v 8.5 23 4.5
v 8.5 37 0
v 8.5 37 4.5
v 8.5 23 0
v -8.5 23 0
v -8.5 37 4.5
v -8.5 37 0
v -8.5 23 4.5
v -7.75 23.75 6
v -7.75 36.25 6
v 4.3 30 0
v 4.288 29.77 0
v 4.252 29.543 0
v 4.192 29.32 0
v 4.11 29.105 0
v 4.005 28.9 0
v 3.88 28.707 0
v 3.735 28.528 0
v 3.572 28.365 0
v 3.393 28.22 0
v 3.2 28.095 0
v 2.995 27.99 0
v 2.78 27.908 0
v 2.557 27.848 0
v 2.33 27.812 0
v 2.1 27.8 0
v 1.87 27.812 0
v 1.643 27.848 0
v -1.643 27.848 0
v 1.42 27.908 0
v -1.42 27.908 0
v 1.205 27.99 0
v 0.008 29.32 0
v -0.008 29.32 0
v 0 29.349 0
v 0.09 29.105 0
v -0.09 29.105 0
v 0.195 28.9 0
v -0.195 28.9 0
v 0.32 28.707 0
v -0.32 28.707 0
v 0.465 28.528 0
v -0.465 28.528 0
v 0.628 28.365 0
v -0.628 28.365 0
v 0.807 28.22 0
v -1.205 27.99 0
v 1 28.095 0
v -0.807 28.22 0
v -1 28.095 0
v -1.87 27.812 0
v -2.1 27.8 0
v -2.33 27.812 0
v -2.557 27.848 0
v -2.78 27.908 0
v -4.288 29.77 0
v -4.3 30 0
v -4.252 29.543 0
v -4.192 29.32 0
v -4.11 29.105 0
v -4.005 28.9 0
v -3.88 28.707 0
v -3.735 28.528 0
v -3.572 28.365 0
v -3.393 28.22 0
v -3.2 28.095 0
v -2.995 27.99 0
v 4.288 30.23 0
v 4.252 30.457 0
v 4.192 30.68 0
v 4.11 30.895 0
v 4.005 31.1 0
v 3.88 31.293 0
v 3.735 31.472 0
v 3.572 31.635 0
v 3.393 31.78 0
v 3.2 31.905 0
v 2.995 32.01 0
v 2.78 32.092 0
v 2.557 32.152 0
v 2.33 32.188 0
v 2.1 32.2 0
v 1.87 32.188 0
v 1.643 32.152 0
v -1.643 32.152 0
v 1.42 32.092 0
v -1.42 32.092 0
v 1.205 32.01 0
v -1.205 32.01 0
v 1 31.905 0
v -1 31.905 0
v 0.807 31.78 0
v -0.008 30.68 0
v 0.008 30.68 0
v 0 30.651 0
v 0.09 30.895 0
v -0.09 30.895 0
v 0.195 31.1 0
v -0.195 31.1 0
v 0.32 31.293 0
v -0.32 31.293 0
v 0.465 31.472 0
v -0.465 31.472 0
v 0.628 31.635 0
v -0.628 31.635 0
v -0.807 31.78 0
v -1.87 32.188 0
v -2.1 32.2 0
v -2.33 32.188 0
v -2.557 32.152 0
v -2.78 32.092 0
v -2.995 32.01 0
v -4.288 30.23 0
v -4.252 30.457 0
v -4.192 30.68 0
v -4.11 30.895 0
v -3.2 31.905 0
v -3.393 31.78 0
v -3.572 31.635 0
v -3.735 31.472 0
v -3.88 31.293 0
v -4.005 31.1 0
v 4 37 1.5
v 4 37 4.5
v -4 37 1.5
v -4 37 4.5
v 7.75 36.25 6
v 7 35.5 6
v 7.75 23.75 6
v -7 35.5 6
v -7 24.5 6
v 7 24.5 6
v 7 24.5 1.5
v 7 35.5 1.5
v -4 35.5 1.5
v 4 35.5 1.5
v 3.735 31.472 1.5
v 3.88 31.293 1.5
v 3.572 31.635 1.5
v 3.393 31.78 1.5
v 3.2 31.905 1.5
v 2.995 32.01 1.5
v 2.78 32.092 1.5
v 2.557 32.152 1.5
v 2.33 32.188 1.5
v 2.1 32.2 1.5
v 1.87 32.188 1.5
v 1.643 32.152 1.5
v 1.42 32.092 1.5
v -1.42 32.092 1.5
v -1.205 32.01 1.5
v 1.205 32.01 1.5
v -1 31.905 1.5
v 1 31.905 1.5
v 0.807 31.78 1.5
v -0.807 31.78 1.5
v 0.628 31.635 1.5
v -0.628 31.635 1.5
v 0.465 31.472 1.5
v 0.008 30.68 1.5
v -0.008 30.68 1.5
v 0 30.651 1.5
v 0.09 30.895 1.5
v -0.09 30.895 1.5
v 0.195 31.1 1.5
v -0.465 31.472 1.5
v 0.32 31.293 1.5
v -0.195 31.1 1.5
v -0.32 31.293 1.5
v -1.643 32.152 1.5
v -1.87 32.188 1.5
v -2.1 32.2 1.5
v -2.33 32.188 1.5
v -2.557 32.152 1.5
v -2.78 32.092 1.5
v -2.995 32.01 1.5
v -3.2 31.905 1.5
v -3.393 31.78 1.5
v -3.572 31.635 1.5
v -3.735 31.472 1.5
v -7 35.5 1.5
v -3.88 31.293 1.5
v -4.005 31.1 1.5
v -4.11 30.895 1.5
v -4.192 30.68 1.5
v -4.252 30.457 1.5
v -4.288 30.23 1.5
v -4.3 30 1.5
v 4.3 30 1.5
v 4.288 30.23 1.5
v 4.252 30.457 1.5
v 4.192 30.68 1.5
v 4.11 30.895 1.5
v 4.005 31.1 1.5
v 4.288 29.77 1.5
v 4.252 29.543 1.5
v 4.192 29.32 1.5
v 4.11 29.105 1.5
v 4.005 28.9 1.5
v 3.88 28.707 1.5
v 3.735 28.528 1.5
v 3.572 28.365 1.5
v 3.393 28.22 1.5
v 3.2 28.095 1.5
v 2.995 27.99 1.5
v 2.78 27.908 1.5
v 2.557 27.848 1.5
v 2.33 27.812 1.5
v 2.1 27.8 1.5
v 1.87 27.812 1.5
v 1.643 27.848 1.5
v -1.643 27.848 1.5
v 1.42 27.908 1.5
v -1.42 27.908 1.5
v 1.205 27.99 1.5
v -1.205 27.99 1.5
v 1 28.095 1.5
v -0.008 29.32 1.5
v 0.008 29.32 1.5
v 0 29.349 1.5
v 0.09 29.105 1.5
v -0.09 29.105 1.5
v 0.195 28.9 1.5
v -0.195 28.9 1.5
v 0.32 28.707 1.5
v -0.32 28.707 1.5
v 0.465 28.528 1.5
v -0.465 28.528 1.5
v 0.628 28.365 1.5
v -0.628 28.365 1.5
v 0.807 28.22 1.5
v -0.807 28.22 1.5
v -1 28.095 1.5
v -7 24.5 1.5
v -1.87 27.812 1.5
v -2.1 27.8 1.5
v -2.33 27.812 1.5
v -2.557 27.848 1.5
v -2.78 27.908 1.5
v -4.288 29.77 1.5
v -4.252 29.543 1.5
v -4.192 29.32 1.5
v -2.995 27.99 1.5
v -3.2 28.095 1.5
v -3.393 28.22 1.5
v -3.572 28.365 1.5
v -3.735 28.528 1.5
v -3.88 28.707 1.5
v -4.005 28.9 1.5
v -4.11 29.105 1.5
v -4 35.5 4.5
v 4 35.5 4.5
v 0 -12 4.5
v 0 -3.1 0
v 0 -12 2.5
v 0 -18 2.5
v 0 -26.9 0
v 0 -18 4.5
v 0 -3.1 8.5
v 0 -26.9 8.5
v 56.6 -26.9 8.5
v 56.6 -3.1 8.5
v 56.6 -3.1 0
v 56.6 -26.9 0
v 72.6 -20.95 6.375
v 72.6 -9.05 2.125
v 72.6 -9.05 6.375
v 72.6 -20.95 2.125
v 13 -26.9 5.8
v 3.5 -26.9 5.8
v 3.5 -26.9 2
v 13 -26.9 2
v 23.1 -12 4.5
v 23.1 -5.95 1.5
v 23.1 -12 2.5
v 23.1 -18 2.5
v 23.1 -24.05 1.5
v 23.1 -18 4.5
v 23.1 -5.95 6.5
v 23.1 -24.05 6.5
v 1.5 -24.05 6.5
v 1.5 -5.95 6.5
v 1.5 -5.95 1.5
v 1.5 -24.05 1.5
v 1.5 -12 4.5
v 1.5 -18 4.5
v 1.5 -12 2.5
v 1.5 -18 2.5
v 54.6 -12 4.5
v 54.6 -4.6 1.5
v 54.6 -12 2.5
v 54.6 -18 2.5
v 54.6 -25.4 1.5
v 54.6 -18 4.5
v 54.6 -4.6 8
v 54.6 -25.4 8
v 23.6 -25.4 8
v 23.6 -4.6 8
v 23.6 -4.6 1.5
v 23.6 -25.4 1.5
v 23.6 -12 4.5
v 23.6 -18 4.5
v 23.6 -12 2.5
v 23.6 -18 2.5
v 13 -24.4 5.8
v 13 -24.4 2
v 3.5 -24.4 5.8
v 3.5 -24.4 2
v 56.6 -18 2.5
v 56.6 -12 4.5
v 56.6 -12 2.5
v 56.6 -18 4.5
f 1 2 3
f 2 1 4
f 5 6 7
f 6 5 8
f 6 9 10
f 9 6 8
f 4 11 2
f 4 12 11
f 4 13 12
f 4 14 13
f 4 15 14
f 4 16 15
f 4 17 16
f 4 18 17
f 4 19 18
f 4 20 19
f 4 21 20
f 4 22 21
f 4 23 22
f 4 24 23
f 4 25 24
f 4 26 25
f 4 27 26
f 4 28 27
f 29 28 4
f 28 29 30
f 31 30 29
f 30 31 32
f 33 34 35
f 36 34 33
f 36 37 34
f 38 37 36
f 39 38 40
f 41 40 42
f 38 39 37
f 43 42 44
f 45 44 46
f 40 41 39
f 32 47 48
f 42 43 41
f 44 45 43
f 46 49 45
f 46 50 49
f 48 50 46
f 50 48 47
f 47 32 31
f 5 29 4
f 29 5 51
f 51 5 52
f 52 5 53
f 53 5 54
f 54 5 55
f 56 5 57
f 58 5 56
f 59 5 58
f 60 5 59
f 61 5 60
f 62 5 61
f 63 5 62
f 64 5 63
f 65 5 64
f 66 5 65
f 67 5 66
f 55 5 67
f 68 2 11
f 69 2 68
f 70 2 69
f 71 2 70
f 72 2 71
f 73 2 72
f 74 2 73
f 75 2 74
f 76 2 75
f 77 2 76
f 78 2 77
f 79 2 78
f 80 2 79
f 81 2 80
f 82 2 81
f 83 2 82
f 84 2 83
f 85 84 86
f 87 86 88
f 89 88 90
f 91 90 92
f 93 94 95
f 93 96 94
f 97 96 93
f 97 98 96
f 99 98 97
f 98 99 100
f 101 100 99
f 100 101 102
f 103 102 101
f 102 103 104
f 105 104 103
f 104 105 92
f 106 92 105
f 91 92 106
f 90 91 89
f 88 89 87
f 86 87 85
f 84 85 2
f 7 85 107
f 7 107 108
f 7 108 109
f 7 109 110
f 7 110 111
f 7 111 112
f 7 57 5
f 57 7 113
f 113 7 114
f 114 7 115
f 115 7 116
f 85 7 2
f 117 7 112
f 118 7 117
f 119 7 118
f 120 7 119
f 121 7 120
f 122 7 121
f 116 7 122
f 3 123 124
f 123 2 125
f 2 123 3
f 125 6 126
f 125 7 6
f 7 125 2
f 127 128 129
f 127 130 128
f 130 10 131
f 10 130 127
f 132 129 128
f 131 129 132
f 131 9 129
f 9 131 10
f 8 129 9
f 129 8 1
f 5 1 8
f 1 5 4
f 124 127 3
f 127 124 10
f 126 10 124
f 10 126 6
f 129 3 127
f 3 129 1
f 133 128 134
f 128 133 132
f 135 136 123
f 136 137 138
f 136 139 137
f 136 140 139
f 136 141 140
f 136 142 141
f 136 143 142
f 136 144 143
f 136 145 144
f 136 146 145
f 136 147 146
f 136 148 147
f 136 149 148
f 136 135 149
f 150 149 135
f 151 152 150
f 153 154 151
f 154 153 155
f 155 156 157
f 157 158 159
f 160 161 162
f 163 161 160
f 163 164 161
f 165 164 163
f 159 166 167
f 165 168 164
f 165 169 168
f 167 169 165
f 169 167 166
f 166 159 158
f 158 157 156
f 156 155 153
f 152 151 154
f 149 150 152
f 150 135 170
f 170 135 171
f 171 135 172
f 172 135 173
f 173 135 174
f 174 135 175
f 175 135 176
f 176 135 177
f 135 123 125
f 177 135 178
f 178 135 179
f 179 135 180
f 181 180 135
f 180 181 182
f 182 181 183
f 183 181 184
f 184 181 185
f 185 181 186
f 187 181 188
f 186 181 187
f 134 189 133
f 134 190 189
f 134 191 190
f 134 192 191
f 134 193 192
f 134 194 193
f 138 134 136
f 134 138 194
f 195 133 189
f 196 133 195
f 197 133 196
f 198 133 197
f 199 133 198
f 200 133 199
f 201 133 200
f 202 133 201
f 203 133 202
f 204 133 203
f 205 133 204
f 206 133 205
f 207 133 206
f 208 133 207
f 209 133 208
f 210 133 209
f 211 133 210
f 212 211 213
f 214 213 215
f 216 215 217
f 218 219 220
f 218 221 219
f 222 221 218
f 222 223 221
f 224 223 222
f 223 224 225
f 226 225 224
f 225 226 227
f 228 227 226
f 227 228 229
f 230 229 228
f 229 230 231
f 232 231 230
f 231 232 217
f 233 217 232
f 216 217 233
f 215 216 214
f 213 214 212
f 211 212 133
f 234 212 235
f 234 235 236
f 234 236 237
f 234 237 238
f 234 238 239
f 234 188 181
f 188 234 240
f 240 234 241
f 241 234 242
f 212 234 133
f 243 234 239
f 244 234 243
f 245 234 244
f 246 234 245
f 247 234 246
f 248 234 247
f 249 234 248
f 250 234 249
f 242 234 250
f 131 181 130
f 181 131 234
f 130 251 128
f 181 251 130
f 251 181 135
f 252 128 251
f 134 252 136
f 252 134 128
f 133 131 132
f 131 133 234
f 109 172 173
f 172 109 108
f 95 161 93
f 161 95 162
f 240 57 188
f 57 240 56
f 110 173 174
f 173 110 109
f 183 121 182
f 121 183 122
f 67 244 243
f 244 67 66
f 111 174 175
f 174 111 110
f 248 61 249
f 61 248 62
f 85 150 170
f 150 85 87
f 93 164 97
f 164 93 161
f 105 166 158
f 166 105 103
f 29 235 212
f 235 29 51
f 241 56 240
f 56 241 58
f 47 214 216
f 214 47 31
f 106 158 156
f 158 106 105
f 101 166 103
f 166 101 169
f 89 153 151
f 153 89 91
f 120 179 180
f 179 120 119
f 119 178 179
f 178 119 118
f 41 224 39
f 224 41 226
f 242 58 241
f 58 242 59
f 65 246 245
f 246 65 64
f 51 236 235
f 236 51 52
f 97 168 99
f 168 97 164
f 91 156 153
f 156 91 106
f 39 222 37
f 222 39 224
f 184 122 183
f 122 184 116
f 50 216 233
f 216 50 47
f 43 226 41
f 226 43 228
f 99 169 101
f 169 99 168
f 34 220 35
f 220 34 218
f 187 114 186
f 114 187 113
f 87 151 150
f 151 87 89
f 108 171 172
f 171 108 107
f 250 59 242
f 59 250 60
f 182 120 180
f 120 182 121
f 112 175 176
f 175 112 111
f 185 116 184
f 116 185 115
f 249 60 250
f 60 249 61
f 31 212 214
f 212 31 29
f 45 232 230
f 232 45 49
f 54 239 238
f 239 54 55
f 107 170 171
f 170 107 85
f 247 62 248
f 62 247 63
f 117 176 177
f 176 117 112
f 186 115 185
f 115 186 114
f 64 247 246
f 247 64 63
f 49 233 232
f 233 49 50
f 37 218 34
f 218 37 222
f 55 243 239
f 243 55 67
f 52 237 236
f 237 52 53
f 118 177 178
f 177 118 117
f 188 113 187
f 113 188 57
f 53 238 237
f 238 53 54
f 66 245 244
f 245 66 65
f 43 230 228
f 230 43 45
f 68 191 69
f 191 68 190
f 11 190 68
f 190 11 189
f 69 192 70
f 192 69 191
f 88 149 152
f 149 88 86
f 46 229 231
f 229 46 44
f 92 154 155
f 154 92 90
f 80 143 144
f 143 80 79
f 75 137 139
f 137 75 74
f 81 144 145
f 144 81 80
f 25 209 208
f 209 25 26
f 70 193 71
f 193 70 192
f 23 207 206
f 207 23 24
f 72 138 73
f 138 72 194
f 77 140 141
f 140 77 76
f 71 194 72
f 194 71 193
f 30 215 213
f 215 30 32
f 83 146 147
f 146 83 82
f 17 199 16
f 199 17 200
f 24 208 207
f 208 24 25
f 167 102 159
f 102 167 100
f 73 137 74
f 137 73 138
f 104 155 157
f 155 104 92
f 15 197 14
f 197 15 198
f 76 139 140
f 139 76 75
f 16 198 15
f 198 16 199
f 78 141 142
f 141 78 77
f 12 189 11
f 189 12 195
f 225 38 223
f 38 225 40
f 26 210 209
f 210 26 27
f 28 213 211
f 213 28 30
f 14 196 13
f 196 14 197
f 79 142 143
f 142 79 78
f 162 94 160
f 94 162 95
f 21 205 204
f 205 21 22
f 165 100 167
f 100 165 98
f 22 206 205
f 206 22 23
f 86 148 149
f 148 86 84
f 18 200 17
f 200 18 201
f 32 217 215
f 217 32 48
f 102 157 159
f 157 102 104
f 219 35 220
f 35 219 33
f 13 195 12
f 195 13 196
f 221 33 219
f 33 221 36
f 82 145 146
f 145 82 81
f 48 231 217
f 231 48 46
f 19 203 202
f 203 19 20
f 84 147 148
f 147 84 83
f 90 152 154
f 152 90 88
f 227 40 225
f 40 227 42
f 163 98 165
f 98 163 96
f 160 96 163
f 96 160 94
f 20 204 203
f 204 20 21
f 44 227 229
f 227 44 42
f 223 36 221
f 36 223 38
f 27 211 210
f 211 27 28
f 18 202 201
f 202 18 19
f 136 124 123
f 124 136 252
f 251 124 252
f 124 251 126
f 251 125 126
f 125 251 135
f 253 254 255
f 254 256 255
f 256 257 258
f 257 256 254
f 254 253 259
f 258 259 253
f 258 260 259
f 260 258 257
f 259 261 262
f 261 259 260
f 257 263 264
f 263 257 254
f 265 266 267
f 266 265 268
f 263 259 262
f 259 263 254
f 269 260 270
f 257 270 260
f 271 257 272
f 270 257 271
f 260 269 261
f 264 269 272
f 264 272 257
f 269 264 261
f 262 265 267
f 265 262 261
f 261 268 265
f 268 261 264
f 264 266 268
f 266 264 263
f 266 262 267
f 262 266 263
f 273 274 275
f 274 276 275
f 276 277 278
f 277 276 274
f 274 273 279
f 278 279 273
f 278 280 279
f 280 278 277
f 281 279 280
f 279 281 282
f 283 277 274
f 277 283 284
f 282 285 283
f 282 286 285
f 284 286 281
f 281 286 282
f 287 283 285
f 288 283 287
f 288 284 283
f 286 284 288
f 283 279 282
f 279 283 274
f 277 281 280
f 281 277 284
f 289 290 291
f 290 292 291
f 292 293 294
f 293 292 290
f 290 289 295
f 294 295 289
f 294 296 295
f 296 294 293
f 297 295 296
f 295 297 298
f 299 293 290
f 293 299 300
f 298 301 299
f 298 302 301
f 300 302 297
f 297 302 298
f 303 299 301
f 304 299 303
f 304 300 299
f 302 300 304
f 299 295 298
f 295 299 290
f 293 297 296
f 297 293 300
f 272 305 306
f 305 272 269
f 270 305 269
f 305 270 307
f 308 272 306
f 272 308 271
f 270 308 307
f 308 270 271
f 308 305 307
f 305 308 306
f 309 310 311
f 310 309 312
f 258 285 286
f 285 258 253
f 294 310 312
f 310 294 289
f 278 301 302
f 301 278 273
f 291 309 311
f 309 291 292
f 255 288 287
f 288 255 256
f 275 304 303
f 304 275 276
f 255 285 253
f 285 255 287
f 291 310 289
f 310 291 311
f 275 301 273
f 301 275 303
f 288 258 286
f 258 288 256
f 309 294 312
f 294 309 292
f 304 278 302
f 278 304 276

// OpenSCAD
// ====================================================================
// Ain Hudhaifa Smart Glasses - 3D Printable Parametric CAD Model (OpenSCAD)
// Model: Full Smart Frame + Modular Clip-on Kit
// Engineered for: Seeed Studio XIAO ESP32-C3 + VL53L1X ToF + 502030 LiPo
// ====================================================================

$fn = 60; // Smooth curve resolution

// --- Real Component Dimensions (in mm) with 0.4mm tolerance ---
VL53_WIDTH  = 13.5 + 0.5;
VL53_HEIGHT = 10.5 + 0.5;
VL53_THICK  = 2.6 + 0.4;
LENS_RADIUS = 2.2;
LENS_SPACING = 4.2;

XIAO_WIDTH  = 21.0 + 0.6;
XIAO_HEIGHT = 17.5 + 0.6;
XIAO_THICK  = 3.5 + 0.5;

BATTERY_LEN   = 30.0 + 1.0;
BATTERY_WIDTH = 20.0 + 0.8;
BATTERY_THICK = 5.0 + 0.5;

WALL = 1.5; // Enclosure wall thickness

// --- 1. Nose Bridge Sensor Housing (VL53L1X) ---
module sensor_bridge_mount() {
    difference() {
        // Outer case
        hull() {
            translate([- (VL53_WIDTH + WALL*2)/2, - (VL53_HEIGHT + WALL*2)/2, 0])
                cube([VL53_WIDTH + WALL*2, VL53_HEIGHT + WALL*2, VL53_THICK + WALL]);
            // Upper chamfer for aerodynamics and aesthetic
            translate([- (VL53_WIDTH + WALL)/2, - (VL53_HEIGHT + WALL)/2, VL53_THICK + WALL + 1])
                cube([VL53_WIDTH + WALL, VL53_HEIGHT + WALL, 0.5]);
        }
        
        // Inner sensor pocket
        translate([- VL53_WIDTH/2, - VL53_HEIGHT/2, WALL])
            cube([VL53_WIDTH, VL53_HEIGHT, VL53_THICK + 2]);
            
        // Dual laser emitter/receiver eyelets (Front facing)
        translate([- LENS_SPACING/2, 0, -1])
            cylinder(r = LENS_RADIUS, h = WALL + 2);
        translate([LENS_SPACING/2, 0, -1])
            cylinder(r = LENS_RADIUS, h = WALL + 2);
            
        // Top wire channel exit (for 4 silicone wires 30AWG)
        translate([-4, (VL53_HEIGHT/2), WALL])
            cube([8, WALL + 2, 3]);
    }
}

// --- 2. Temple Electronics Enclosure (Right Arm) ---
module temple_electronics_case() {
    total_len = XIAO_WIDTH + BATTERY_LEN + 4;
    case_w = max(XIAO_HEIGHT, BATTERY_WIDTH) + WALL*2;
    case_h = max(XIAO_THICK, BATTERY_THICK) + WALL*2;
    
    difference() {
        // Sleek aerodynamic outer arm housing
        hull() {
            translate([0, -case_w/2, 0])
                cube([total_len, case_w, case_h]);
            // Tapered end towards ear curve
            translate([total_len + 15, -case_w/4, case_h/4])
                cube([1, case_w/2, case_h/2]);
        }
        
        // XIAO ESP32-C3 Pocket
        translate([WALL, -XIAO_HEIGHT/2, WALL])
            cube([XIAO_WIDTH, XIAO_HEIGHT, XIAO_THICK + 1]);
            
        // LiPo 502030 Battery Pocket
        translate([XIAO_WIDTH + 2, -BATTERY_WIDTH/2, WALL])
            cube([BATTERY_LEN, BATTERY_WIDTH, BATTERY_THICK + 1]);
            
        // USB-C Charging Port Slot (Bottom facing)
        translate([WALL + 2, -case_w/2 - 1, WALL + 0.5])
            cube([9.5, WALL + 2, 3.8]);
            
        // Internal wire passway
        translate([0, -3, WALL + 1])
            cube([total_len, 6, 2]);
    }
}

// --- Render preview ---
translate([0, 30, 0]) sensor_bridge_mount();
translate([0, -15, 0]) temple_electronics_case();
